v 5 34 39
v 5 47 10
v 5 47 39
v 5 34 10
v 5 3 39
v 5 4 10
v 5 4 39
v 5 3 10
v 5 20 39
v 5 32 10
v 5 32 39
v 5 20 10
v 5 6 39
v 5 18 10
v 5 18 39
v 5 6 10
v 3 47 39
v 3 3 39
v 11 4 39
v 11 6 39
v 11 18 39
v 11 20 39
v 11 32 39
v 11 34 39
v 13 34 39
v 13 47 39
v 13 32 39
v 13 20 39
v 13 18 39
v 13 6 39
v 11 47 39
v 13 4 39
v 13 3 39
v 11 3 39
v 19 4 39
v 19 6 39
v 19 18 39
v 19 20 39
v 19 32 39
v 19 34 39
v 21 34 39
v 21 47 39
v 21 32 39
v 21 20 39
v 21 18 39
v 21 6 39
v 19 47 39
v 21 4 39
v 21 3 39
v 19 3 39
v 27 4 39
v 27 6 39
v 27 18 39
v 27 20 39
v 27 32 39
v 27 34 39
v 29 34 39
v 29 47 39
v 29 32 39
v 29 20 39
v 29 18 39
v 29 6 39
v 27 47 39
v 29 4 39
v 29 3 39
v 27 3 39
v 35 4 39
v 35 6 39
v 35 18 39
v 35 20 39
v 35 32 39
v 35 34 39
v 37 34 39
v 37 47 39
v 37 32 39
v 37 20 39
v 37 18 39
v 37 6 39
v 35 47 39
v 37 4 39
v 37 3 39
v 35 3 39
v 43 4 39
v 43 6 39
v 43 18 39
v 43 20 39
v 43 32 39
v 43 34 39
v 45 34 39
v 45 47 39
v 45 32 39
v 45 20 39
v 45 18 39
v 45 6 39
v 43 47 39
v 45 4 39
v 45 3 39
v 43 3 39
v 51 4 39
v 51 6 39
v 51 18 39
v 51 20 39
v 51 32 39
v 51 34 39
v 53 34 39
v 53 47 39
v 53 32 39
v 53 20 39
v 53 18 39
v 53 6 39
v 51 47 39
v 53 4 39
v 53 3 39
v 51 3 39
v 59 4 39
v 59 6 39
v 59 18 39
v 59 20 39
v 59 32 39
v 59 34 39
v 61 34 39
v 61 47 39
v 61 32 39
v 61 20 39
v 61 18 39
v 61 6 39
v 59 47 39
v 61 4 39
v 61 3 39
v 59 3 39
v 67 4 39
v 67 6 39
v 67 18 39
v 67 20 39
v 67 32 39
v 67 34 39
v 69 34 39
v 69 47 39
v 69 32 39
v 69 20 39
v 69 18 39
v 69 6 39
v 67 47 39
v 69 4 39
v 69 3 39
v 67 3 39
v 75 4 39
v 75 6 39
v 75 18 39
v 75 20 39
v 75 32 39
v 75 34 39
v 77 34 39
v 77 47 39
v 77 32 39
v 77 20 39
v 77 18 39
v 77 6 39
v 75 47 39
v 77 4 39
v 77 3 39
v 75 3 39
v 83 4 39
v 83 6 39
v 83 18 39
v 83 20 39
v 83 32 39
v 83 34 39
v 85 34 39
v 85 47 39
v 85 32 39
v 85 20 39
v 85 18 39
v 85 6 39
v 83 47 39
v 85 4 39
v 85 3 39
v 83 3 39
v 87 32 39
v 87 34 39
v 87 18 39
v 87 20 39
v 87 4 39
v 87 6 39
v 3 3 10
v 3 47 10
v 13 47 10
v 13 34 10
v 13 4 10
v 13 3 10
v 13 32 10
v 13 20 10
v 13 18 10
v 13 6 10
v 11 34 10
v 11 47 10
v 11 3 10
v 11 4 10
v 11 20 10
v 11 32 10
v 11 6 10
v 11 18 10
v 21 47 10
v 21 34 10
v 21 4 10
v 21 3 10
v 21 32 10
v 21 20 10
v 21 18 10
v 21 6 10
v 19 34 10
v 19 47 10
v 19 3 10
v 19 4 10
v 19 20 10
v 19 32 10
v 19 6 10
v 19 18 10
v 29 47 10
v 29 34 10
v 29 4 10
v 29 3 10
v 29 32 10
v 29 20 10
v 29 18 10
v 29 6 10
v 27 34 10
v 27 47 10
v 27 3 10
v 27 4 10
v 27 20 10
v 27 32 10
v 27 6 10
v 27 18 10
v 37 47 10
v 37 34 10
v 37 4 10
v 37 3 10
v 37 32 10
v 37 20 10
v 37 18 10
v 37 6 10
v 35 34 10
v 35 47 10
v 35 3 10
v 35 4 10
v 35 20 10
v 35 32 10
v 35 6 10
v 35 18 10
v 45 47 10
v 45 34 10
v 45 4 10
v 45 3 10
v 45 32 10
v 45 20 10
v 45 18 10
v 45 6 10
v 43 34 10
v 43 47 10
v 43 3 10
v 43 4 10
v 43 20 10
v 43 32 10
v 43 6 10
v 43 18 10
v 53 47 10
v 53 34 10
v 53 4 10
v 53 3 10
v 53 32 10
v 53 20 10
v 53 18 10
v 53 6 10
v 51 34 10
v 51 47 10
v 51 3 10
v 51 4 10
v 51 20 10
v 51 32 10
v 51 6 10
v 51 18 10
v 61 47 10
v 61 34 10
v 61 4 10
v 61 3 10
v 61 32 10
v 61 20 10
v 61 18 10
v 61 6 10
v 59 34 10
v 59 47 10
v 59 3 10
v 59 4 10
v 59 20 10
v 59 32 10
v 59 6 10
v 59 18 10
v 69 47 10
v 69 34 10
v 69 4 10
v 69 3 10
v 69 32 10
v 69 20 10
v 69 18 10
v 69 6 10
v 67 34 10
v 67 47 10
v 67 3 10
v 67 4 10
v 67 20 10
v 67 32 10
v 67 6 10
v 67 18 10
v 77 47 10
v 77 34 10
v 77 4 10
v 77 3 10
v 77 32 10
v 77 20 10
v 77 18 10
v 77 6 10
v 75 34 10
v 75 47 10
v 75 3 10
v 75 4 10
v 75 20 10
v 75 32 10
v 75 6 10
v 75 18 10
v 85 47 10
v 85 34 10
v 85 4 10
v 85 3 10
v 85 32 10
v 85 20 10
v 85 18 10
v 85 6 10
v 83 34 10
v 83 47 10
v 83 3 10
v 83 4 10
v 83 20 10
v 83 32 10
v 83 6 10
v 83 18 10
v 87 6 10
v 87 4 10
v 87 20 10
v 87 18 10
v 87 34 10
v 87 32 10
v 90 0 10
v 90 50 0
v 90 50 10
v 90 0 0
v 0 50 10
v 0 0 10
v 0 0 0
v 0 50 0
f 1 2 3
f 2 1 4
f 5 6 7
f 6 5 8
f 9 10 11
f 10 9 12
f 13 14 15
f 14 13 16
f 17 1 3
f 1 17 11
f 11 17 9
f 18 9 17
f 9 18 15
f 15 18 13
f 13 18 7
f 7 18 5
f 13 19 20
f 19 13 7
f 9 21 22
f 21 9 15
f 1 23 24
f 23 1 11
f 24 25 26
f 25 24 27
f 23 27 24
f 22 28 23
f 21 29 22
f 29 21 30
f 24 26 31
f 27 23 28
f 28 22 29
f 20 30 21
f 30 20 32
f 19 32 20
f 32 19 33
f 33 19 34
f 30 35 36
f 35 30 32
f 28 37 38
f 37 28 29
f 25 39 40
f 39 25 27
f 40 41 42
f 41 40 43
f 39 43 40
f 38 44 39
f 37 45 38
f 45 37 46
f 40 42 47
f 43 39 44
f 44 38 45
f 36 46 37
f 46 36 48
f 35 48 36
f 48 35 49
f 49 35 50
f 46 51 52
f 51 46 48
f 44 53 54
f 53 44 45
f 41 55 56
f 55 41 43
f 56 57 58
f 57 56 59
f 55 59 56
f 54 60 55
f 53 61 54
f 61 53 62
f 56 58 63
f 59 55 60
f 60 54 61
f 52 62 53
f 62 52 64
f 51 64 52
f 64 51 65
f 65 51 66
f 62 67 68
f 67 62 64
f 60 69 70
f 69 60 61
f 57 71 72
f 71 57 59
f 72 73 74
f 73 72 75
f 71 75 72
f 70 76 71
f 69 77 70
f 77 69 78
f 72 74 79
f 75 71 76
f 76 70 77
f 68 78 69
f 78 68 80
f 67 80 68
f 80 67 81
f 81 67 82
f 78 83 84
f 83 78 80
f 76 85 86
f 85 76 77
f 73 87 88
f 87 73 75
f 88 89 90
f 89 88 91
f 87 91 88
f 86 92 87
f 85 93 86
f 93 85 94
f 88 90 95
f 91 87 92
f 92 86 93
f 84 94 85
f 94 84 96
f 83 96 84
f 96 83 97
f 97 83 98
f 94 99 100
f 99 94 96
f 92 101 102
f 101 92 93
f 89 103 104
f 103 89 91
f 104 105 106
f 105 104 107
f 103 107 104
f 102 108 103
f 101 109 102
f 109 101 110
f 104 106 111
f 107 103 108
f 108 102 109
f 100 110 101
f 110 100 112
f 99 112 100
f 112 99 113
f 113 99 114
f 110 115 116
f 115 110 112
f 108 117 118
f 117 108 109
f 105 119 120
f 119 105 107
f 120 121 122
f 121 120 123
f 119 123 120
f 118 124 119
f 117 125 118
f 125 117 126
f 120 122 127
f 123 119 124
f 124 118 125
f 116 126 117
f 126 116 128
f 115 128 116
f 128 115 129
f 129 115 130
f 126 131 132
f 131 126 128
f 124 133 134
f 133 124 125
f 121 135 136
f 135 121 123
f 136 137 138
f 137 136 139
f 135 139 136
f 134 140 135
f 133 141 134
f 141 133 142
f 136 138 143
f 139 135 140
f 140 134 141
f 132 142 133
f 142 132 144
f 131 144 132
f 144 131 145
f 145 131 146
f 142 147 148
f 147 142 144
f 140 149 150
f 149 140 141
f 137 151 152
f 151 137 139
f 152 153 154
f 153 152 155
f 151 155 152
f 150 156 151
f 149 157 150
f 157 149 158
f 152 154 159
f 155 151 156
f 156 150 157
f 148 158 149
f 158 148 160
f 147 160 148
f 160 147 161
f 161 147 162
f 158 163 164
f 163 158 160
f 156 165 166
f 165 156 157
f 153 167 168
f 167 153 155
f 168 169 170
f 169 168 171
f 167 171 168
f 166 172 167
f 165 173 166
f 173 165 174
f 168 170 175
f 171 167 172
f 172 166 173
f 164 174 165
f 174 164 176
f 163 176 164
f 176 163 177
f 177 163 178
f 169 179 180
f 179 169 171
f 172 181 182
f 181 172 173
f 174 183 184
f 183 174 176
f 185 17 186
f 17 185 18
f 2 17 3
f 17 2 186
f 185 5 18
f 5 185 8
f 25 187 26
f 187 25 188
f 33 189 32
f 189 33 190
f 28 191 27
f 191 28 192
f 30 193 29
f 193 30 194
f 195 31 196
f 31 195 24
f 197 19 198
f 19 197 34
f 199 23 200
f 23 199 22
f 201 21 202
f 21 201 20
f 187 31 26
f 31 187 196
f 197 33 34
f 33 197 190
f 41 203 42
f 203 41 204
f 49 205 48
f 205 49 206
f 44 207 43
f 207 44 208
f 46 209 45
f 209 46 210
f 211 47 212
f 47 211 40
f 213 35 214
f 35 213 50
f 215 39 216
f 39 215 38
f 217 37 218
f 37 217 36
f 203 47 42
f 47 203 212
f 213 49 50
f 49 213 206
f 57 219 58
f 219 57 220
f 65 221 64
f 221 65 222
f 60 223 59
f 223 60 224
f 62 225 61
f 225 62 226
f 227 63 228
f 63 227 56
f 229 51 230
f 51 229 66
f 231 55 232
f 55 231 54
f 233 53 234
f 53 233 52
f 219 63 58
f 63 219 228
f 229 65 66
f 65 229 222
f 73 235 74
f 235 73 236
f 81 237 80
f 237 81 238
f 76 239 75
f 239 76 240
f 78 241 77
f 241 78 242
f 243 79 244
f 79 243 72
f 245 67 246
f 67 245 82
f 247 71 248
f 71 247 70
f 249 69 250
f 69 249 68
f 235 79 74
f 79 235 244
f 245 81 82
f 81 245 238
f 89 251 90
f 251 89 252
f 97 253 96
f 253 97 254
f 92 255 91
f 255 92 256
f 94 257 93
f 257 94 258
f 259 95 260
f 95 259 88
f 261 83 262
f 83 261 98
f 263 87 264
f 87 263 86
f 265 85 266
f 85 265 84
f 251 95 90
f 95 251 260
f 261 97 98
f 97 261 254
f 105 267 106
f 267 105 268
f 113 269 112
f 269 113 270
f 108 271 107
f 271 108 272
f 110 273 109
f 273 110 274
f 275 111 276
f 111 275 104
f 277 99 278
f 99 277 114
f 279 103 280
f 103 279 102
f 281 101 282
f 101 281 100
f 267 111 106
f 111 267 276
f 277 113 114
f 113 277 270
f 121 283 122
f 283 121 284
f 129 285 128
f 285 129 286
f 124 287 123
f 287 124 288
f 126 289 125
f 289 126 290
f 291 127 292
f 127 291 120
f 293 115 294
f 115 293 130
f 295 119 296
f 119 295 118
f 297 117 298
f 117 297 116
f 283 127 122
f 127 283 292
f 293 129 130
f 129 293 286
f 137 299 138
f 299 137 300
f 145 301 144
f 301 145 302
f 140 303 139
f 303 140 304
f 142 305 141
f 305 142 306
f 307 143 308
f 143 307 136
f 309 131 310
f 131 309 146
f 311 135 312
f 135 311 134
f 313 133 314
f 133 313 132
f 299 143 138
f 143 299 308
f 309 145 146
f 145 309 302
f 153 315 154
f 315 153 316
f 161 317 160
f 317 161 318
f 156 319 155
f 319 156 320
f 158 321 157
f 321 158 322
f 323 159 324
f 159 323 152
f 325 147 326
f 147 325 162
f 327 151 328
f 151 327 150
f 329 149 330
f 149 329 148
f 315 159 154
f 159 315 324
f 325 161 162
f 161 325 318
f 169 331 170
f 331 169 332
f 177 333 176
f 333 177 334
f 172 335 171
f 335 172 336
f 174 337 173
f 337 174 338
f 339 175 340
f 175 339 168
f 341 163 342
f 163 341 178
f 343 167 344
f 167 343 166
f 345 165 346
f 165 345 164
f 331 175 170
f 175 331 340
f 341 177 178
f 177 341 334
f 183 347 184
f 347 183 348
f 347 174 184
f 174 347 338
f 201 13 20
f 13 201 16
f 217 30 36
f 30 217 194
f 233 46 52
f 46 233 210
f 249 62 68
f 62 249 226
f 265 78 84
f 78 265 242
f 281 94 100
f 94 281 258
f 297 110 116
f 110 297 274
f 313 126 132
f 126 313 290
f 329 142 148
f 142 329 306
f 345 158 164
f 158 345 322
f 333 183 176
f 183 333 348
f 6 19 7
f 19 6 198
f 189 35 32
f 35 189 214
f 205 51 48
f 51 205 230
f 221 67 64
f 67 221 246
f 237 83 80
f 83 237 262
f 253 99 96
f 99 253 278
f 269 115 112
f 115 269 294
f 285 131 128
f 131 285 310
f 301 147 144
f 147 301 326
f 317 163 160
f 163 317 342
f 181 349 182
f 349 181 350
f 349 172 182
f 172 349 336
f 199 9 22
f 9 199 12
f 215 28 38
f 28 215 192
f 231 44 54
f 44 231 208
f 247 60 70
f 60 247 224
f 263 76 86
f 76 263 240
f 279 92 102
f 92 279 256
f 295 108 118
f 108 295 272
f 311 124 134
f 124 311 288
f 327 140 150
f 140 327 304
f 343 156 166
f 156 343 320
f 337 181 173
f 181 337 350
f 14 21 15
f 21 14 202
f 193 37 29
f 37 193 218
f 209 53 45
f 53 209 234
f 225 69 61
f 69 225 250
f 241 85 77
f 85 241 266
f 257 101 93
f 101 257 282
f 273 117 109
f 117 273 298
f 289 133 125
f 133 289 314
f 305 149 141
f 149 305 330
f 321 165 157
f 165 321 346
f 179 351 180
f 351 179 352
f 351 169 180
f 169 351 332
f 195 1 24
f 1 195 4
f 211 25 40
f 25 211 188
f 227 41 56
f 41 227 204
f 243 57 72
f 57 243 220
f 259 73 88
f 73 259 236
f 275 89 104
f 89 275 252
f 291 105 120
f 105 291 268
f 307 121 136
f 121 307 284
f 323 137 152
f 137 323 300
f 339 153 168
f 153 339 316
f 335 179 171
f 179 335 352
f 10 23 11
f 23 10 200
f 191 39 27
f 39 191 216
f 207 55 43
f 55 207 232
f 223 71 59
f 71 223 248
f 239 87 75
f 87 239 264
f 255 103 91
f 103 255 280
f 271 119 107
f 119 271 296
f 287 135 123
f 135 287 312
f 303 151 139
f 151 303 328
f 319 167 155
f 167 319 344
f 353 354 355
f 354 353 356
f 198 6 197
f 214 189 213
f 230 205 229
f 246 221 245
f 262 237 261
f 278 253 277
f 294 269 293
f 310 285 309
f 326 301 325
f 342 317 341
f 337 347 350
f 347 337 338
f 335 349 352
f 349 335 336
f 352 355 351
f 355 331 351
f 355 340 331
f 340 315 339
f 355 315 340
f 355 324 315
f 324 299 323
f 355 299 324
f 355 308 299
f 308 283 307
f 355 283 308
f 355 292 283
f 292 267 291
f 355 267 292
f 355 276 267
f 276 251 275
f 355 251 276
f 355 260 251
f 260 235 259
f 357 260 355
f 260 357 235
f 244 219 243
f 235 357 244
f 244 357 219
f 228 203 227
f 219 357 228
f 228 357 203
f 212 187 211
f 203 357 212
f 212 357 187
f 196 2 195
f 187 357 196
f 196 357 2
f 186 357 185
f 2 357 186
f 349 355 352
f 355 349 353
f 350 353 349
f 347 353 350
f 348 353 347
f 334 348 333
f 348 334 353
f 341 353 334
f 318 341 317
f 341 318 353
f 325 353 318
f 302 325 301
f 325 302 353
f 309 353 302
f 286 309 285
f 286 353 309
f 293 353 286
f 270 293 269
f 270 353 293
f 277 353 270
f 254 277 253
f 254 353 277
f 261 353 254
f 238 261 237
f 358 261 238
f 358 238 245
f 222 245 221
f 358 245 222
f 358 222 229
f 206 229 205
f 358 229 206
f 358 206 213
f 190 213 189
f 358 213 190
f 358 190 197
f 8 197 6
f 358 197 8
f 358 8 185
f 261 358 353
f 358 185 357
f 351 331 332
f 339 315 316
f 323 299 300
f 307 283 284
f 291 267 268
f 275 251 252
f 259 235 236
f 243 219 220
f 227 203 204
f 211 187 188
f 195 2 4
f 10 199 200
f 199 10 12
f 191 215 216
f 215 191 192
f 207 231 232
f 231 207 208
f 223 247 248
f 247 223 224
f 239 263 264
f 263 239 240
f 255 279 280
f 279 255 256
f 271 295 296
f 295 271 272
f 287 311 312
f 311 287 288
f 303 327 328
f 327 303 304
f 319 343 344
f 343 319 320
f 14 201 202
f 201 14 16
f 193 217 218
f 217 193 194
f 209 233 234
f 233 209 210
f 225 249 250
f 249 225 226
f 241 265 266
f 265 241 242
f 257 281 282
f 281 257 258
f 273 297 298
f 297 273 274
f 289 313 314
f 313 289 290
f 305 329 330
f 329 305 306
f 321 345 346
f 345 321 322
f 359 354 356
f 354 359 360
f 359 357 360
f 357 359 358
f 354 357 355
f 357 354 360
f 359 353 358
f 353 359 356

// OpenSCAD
$fn = 32;

// ----------------------------------------------------------------------
// Heatsink: cross fin block
// ----------------------------------------------------------------------

// --- parameters (mm) ---
base_l = 90;              // base length, X
base_w = 50;              // base width, Y
base_t = 10;              // base plate thickness
fin_h = 30;               // fin height above the base
fin_t = 2;                // fin thickness
edge = 3;                 // margin from the base ends
pitch = 8;                // fin pitch
rib_pitch = 14;           // cross rib pitch

n_fins = floor((base_l - 2 * edge - fin_t) / pitch) + 1;  // fin count
total_h = base_t + fin_h - 1;  // overall height
n_ribs = floor((base_w - 2 * edge) / rib_pitch);  // rib count

union() {
  cube([base_l, base_w, base_t]);
  for (i = [0 : n_fins - 1])
    translate([edge + i * pitch, edge, base_t - 1])
      cube([fin_t, base_w - 2 * edge, fin_h]);
  for (i = [0 : n_ribs - 1])
    translate([edge, edge + 1 + i * rib_pitch, base_t - 1])
      cube([base_l - 2 * edge, fin_t, fin_h]);
}
